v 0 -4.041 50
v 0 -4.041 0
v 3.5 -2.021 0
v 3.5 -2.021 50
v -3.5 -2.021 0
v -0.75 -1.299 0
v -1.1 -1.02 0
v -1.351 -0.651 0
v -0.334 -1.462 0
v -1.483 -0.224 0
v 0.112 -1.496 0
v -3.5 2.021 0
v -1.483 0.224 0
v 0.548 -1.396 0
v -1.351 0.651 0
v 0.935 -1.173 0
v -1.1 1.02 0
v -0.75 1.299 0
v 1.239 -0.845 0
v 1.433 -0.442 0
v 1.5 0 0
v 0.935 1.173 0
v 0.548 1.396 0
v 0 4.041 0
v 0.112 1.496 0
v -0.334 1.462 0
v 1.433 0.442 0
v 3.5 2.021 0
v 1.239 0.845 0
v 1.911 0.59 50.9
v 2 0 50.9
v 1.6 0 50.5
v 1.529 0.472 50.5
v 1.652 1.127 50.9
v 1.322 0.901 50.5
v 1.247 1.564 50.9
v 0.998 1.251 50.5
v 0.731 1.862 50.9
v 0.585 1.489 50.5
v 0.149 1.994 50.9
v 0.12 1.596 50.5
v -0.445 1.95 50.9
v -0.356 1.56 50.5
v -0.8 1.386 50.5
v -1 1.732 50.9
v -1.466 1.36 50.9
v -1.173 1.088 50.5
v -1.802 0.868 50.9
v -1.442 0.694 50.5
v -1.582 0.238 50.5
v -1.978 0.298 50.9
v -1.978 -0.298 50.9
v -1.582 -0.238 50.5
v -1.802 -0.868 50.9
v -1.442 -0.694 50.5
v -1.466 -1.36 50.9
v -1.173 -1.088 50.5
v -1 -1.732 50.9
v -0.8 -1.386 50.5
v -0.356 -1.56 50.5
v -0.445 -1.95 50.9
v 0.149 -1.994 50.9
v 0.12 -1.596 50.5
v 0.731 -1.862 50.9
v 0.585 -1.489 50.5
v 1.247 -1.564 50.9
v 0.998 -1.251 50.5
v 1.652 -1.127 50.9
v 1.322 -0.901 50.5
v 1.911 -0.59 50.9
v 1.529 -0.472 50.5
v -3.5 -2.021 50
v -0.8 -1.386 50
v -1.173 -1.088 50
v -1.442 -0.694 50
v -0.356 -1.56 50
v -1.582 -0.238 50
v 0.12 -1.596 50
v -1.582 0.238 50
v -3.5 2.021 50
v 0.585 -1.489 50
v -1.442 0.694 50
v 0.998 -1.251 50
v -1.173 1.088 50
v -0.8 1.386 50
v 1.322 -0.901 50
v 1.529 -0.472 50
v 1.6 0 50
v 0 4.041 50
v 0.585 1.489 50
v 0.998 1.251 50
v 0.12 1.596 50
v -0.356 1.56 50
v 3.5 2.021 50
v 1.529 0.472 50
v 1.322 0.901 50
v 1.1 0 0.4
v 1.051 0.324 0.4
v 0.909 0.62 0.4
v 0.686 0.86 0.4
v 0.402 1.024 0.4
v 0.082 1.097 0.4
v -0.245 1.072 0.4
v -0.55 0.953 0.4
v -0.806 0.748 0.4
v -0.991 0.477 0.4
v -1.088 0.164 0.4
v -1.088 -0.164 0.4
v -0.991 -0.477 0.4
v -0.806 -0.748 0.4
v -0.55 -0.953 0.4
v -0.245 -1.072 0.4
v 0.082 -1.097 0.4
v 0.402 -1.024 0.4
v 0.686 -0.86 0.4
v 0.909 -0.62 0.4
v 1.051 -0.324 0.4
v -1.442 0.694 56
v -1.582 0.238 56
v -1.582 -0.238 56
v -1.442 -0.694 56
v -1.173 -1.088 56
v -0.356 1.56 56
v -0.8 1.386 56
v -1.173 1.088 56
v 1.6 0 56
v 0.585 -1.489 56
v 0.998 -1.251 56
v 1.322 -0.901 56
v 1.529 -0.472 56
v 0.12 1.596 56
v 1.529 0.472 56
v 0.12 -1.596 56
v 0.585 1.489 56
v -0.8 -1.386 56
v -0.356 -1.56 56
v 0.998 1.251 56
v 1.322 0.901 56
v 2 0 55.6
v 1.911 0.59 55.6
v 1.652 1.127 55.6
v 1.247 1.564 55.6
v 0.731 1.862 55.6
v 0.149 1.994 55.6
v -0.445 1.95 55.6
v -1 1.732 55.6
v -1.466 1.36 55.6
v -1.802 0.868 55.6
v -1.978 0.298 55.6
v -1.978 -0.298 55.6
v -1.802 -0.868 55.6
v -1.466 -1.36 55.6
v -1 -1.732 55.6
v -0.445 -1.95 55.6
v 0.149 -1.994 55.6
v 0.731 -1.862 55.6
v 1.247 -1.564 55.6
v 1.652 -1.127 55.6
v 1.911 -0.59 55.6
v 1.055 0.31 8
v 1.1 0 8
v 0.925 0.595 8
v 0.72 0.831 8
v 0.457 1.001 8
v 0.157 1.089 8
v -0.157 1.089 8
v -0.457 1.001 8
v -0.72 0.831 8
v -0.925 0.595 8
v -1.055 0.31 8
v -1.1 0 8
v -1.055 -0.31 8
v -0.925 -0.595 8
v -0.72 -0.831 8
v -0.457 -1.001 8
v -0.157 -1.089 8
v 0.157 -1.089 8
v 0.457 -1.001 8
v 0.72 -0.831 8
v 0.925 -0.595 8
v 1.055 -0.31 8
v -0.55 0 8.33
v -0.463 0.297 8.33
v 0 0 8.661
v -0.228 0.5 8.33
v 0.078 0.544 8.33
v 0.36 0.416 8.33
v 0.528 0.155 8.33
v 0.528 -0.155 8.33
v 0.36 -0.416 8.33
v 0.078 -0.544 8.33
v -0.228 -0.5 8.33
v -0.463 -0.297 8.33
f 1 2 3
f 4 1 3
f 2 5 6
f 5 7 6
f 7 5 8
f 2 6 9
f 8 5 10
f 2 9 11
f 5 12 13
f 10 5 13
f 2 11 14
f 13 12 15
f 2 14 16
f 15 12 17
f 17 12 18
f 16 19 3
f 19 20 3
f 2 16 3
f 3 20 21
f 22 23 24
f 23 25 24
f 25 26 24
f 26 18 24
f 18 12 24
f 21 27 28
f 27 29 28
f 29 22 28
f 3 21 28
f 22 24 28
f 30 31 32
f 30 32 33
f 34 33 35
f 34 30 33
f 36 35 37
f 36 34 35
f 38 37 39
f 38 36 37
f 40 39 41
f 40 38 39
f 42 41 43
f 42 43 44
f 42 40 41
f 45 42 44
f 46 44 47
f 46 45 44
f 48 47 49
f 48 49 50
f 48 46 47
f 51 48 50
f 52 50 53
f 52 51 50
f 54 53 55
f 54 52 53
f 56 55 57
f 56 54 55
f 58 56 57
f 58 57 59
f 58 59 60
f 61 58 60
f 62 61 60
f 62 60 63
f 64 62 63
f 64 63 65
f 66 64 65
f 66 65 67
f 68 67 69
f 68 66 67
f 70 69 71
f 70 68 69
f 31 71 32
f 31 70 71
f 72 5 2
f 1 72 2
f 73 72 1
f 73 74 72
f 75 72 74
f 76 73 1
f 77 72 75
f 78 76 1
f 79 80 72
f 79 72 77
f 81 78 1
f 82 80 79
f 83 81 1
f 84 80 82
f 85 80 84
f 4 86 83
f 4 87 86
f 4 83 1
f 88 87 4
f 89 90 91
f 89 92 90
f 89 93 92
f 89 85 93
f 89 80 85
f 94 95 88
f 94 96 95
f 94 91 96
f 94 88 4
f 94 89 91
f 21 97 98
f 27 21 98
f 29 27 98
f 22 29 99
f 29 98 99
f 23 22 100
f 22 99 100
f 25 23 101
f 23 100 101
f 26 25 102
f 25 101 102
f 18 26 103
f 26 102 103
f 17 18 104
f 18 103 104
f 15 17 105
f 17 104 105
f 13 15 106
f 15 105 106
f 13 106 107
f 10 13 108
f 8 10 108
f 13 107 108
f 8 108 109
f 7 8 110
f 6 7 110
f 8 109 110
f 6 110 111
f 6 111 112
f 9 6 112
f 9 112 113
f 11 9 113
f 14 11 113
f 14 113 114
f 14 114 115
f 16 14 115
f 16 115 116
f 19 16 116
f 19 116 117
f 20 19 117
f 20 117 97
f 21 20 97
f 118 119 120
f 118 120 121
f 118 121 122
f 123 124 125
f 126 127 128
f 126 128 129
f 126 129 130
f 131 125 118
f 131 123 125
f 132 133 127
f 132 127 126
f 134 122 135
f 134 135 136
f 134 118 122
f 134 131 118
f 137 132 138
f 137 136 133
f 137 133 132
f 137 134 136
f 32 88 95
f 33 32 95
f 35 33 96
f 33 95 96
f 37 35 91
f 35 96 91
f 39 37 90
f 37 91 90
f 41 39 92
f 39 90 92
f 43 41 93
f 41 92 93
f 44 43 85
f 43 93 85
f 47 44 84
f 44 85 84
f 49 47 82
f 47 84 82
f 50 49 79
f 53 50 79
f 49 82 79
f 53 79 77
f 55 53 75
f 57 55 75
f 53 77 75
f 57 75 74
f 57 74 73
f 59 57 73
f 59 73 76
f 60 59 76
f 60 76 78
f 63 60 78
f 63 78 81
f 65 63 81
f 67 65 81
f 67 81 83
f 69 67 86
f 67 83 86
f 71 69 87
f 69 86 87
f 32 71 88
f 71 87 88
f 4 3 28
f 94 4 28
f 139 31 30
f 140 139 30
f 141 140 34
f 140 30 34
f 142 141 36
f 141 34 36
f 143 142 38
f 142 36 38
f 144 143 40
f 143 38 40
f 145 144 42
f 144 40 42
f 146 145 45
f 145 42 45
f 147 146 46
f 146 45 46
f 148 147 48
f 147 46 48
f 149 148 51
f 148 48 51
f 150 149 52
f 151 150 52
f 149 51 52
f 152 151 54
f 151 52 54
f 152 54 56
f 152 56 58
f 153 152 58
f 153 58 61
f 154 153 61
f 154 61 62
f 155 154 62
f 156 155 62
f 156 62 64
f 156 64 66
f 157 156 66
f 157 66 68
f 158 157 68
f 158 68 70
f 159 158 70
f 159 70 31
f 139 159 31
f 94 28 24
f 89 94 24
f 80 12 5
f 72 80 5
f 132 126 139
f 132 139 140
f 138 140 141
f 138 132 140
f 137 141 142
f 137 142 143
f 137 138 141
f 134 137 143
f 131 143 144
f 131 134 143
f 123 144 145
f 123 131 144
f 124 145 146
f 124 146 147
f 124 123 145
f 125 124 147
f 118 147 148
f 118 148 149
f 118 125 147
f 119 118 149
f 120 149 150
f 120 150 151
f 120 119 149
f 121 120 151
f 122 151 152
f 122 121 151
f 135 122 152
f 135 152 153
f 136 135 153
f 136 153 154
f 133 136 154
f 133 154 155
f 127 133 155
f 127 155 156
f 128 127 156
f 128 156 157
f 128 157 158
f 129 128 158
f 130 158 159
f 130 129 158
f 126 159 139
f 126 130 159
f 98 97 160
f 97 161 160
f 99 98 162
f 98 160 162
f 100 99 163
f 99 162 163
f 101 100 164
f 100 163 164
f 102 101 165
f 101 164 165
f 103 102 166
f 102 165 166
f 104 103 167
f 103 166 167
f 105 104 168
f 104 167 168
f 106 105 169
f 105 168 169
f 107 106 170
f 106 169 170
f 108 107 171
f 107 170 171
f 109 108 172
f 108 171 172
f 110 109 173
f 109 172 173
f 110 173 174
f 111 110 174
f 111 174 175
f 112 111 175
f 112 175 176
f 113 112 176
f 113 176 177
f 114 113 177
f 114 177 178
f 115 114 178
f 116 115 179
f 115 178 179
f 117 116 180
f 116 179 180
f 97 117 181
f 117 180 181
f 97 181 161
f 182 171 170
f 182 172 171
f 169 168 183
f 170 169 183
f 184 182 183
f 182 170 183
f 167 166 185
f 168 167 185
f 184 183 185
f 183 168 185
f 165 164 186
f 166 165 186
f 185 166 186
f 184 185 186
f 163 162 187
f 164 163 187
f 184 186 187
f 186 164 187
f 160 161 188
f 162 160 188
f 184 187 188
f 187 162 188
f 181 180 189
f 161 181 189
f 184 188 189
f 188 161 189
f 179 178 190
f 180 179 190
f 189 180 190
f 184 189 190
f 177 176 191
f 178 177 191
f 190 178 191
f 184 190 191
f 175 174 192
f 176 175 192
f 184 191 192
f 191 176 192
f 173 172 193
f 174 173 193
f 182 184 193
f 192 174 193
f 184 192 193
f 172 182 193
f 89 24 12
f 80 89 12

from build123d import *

# Parameters (mm, degrees)
EXTRUDE_1_DEPTH             = 50
SKETCH_2_R                  = 2
EXTRUDE_2_DEPTH             = 6
SKETCH_3_R                  = 2
SKETCH_3_R_2                = 1.6
CUT_EXTRUDE_3_DEPTH         = 0.5
CHAMFER_1_SIZE              = 0.4
HOLE_WIZARD_M31_D           = 2.2
HOLE_WIZARD_M31_DEPTH       = 8
HOLE_WIZARD_M31_CSINK_D     = 3
HOLE_WIZARD_M31_CSINK_ANGLE = 90
HOLE_WIZARD_M31_TIP         = 0.660946681


with BuildPart() as part:
    # Эскиз1 → Вытянуть1 (new body)
    with BuildSketch(Plane.XY):
        Polygon((0, 4.041451884), (-3.5, 2.020725942), (-3.5, -2.020725942), (0, -4.041451884), (3.5, -2.020725942), (3.5, 2.020725942), align=None)
    extrude(amount=EXTRUDE_1_DEPTH)

    # Эскиз2 → Вытянуть2 (add)
    with BuildSketch(Plane.XY.offset(50)):
        Circle(SKETCH_2_R)
    extrude(amount=EXTRUDE_2_DEPTH)

    # Эскиз3 → Вырез-Вытянуть3 (cut)
    with BuildSketch(Plane.XY.offset(50)):
        Circle(SKETCH_3_R)
        Circle(SKETCH_3_R_2, mode=Mode.SUBTRACT)
    extrude(amount=CUT_EXTRUDE_3_DEPTH, mode=Mode.SUBTRACT)

    # Фаска1
    chamfer_1_edges = [part.edges().sort_by_distance(p)[0] for p in [
        (-2, 0, 56),
        (-2, 0, 50.5),
    ]]
    chamfer(chamfer_1_edges, length=CHAMFER_1_SIZE - 0.0001)  # a hair under: the kernel refuses the full size

    # Отверстие с зазором M31
    with Locations(Plane(origin=(0, 0, 0), x_dir=(-1, 0, 0), z_dir=(0, 0, -1))):
        with Locations((0, 0)):
            CounterSinkHole(HOLE_WIZARD_M31_D / 2, HOLE_WIZARD_M31_CSINK_D / 2, depth=HOLE_WIZARD_M31_DEPTH, counter_sink_angle=HOLE_WIZARD_M31_CSINK_ANGLE)
            with Locations((0, 0, -(HOLE_WIZARD_M31_DEPTH + HOLE_WIZARD_M31_TIP / 2))):  # 118° drill point
                Cone(0, HOLE_WIZARD_M31_D / 2, HOLE_WIZARD_M31_TIP, mode=Mode.SUBTRACT)


solid = part.part
